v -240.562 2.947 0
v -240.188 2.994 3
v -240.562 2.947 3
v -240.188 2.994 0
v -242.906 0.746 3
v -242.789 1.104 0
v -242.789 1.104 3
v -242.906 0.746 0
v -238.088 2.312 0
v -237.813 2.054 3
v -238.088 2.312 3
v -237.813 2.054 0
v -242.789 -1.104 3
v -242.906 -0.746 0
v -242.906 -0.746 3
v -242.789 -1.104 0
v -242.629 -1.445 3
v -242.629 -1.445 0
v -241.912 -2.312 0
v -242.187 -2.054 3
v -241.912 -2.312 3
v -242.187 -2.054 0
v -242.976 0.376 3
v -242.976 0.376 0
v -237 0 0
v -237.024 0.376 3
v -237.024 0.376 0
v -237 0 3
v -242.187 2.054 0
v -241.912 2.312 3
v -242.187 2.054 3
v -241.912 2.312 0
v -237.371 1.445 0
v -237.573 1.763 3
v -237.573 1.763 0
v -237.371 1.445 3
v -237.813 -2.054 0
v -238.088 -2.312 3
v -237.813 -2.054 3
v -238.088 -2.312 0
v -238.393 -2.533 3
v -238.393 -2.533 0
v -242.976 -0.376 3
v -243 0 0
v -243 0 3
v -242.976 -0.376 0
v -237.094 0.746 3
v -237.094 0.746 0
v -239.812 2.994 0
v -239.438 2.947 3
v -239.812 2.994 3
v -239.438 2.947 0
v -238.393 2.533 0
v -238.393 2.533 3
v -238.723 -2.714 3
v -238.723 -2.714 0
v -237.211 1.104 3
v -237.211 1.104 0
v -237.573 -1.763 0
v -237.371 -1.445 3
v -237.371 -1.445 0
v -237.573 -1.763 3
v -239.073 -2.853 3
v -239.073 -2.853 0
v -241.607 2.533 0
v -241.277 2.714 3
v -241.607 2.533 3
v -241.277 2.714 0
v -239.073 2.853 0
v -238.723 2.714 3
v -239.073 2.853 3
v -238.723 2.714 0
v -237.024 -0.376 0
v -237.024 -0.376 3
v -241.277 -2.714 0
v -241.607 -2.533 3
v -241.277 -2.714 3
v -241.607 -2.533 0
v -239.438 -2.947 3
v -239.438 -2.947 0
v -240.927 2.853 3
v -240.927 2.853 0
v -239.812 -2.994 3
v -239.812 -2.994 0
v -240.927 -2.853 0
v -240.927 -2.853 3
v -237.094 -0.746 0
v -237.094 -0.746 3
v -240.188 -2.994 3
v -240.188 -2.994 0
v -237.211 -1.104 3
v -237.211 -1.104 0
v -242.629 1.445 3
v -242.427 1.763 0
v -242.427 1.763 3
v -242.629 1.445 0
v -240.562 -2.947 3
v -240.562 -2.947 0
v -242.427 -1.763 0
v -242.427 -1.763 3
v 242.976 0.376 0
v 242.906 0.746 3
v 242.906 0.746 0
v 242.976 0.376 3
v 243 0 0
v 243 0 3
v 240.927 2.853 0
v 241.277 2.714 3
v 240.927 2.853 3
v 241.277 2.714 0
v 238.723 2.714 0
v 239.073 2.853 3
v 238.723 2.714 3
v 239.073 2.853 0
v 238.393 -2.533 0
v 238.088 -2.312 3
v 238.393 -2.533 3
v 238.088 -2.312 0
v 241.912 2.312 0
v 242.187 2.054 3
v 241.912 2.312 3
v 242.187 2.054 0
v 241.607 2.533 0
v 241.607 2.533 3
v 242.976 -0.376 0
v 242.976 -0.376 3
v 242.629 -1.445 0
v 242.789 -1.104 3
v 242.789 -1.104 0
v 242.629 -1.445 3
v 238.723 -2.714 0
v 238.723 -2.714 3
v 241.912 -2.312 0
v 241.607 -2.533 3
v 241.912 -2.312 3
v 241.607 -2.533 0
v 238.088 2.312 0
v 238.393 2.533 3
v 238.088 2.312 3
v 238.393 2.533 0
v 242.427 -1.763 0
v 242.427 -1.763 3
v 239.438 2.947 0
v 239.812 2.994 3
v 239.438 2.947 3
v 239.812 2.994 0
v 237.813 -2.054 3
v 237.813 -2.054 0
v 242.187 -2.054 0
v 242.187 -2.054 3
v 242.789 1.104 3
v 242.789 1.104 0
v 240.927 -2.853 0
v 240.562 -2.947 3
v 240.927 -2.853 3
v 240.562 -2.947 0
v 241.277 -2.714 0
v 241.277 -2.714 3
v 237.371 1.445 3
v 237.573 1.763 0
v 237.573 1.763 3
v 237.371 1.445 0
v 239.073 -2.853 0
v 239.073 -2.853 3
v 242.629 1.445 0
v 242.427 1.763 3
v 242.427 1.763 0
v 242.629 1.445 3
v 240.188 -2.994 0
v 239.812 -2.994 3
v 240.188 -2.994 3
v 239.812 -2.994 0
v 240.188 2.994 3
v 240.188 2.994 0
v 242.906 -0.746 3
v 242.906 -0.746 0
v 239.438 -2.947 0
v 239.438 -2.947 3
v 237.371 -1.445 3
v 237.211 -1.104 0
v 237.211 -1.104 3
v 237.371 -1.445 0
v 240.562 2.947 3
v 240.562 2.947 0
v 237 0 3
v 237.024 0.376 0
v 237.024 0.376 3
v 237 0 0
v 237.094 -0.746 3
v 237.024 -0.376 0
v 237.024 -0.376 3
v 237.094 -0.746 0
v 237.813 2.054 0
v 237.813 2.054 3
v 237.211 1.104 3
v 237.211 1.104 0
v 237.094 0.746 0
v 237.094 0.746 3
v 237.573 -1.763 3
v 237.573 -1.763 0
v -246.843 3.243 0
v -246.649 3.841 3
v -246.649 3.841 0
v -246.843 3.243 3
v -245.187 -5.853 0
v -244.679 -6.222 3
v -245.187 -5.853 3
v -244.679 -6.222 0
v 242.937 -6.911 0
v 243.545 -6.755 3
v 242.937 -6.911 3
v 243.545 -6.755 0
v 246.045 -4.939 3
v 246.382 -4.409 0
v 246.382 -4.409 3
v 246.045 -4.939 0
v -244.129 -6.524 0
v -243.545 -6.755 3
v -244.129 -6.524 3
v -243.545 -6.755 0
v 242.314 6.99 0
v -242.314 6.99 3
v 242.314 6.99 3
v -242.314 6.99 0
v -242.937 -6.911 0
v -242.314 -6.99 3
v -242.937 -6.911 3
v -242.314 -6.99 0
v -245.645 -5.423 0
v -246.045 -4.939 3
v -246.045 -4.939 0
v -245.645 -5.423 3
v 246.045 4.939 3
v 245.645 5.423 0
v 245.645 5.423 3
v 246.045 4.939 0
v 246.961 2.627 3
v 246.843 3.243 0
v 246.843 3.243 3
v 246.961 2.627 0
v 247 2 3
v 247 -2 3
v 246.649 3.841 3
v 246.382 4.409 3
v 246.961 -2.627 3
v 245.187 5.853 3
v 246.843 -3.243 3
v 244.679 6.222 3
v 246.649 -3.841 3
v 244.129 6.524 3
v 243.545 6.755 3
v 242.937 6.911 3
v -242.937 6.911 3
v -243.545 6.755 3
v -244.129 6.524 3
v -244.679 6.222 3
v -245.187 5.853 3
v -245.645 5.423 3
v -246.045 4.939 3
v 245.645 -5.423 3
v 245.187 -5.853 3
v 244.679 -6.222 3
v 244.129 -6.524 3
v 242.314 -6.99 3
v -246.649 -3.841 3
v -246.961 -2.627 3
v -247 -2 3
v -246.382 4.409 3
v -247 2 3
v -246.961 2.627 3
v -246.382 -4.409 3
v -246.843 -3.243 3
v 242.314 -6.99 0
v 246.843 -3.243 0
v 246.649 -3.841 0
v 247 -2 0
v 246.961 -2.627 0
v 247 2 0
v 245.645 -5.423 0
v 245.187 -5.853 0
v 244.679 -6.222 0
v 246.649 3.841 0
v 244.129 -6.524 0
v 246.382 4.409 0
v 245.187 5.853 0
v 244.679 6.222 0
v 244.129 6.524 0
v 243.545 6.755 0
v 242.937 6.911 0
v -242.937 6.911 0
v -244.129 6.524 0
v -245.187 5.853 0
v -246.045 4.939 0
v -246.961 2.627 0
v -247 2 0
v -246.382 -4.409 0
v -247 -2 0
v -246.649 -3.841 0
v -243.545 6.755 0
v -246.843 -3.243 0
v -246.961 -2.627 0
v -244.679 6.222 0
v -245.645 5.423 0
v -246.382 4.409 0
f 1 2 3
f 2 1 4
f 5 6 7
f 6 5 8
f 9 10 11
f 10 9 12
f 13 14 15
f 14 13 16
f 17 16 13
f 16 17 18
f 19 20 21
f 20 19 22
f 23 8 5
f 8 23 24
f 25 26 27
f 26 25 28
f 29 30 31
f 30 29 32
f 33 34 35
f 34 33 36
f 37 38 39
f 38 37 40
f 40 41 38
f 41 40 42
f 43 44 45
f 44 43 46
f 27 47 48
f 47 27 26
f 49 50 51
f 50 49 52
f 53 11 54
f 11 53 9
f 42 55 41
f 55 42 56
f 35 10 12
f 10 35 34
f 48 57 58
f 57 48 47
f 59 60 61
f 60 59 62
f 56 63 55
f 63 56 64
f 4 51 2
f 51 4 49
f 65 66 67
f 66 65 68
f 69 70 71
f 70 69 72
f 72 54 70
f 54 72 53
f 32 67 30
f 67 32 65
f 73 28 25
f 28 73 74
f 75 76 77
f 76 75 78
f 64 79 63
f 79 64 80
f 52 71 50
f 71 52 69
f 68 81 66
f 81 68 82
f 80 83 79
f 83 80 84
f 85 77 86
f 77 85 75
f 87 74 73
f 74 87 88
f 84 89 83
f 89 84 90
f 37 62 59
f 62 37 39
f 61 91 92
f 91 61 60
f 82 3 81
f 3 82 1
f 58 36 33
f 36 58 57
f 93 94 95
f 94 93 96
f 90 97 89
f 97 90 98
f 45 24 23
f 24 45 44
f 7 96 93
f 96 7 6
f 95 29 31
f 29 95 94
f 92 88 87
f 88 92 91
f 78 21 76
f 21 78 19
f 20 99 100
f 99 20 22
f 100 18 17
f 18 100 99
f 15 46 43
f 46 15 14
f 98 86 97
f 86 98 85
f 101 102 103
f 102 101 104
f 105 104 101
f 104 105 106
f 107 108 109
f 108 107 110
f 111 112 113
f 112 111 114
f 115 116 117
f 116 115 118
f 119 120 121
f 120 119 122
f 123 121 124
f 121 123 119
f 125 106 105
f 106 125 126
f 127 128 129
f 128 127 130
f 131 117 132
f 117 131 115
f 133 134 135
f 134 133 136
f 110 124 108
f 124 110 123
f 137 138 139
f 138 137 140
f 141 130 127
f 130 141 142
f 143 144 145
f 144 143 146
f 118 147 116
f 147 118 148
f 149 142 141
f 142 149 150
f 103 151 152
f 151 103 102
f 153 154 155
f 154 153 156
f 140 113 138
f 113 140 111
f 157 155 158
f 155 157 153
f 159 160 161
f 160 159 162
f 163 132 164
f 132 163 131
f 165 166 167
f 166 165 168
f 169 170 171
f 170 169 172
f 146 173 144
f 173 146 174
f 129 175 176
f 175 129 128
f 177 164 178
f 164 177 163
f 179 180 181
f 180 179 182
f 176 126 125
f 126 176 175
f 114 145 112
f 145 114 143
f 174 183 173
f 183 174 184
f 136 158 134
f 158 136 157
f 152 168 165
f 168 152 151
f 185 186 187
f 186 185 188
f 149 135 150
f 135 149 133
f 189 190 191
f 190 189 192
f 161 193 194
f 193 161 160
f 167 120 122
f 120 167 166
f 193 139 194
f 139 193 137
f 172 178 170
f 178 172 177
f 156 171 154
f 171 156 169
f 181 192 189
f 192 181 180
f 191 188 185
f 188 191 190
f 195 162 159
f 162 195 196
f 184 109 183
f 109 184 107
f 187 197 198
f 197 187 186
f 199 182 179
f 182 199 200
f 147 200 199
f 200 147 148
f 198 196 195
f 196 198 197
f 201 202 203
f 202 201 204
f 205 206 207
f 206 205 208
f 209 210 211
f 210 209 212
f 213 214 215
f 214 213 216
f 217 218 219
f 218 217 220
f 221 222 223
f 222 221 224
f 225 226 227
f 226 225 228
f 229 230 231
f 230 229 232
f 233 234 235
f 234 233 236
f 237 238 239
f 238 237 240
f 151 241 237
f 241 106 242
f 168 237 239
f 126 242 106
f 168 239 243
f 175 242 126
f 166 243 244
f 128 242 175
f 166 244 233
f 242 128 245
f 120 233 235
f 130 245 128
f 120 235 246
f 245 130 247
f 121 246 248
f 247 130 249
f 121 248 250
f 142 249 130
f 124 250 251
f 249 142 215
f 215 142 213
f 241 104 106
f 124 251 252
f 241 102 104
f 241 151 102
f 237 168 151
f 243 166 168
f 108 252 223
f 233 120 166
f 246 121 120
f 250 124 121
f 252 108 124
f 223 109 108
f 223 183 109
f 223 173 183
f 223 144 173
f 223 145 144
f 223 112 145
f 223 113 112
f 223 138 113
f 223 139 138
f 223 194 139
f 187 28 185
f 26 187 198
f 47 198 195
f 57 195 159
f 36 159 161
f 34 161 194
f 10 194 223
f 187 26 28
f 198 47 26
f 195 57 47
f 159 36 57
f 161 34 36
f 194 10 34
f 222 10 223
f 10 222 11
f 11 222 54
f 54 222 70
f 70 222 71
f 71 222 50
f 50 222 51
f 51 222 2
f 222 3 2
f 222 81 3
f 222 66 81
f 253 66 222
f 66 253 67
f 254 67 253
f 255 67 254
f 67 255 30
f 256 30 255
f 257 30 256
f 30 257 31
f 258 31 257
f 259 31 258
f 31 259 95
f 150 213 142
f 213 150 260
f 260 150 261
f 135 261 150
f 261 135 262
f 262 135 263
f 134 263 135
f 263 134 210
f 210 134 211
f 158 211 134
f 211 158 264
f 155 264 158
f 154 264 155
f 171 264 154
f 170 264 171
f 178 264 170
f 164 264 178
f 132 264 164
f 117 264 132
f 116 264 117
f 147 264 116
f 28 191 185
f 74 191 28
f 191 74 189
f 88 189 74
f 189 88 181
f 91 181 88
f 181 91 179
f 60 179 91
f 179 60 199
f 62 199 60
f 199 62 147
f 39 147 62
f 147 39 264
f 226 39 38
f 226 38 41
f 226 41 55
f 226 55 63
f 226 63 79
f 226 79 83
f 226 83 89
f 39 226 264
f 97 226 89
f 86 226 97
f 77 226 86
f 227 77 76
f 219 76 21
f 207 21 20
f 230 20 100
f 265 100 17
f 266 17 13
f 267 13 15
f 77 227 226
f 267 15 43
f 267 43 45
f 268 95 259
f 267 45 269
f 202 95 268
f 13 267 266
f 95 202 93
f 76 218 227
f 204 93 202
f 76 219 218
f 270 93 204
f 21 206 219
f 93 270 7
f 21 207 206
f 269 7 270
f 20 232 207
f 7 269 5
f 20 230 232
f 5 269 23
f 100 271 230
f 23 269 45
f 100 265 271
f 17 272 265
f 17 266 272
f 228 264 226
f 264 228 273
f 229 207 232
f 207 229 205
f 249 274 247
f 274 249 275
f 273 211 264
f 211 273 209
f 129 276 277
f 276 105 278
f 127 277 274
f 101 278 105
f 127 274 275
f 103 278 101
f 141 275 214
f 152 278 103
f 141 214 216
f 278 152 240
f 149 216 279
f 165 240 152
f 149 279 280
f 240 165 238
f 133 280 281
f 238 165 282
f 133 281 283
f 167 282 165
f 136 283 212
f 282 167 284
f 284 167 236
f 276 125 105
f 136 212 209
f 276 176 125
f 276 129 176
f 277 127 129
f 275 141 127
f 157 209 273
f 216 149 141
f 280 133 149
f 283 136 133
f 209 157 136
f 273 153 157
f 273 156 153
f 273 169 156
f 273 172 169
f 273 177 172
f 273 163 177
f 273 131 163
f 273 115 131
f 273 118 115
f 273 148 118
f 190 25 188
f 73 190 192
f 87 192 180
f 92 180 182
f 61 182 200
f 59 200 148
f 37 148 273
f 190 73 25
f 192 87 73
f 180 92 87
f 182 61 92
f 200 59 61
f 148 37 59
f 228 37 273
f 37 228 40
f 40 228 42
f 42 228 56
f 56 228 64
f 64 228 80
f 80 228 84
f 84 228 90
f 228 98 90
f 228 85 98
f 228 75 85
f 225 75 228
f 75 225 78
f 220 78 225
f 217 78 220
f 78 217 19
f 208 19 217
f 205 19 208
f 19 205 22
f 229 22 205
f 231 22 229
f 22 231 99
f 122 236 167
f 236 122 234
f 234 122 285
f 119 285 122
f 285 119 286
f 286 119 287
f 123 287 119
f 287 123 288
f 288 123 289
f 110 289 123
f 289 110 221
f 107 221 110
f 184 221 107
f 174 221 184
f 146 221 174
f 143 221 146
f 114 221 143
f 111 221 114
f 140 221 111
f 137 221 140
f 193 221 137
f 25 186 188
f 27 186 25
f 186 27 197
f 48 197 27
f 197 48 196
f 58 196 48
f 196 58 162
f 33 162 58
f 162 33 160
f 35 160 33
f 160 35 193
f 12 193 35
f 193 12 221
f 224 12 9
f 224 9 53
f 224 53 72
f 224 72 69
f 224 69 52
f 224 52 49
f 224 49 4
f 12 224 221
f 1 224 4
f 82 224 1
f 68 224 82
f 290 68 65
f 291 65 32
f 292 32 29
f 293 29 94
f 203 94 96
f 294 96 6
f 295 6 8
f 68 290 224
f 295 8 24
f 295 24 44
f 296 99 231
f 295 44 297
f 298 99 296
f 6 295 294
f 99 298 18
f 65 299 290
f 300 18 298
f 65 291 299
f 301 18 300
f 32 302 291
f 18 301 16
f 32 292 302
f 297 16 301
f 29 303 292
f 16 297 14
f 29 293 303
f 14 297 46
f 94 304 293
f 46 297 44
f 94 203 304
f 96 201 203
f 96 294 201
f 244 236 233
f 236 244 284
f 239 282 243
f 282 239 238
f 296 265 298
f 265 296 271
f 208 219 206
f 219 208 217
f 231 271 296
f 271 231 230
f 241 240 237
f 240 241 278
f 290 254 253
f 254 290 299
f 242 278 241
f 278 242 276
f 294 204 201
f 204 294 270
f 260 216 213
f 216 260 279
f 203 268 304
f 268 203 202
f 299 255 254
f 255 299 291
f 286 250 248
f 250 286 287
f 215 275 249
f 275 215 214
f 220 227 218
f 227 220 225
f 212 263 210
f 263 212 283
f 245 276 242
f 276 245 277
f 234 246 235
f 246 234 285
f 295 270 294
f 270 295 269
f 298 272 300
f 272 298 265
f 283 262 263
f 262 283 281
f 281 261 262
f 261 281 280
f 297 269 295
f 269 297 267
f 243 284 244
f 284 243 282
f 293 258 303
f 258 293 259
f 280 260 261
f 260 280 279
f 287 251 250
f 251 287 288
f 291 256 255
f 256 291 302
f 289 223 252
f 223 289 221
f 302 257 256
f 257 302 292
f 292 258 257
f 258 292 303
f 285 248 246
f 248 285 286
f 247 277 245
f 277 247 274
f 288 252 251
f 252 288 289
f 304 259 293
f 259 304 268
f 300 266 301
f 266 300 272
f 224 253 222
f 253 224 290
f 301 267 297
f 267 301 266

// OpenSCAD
$fn = 50;


difference() {
	union() {
		hull() {
			translate(v = [-242.0000000000, 2.0000000000, 0]) {
				cylinder(h = 3, r = 5);
			}
			translate(v = [242.0000000000, 2.0000000000, 0]) {
				cylinder(h = 3, r = 5);
			}
			translate(v = [-242.0000000000, -2.0000000000, 0]) {
				cylinder(h = 3, r = 5);
			}
			translate(v = [242.0000000000, -2.0000000000, 0]) {
				cylinder(h = 3, r = 5);
			}
		}
	}
	union() {
		translate(v = [-240.0000000000, 0.0000000000, -100.0000000000]) {
			cylinder(h = 200, r = 3.0000000000);
		}
		translate(v = [-240.0000000000, 0.0000000000, -100.0000000000]) {
			cylinder(h = 200, r = 3.0000000000);
		}
		translate(v = [240.0000000000, 0.0000000000, -100.0000000000]) {
			cylinder(h = 200, r = 3.0000000000);
		}
		translate(v = [240.0000000000, 0.0000000000, -100.0000000000]) {
			cylinder(h = 200, r = 3.0000000000);
		}
	}
}
